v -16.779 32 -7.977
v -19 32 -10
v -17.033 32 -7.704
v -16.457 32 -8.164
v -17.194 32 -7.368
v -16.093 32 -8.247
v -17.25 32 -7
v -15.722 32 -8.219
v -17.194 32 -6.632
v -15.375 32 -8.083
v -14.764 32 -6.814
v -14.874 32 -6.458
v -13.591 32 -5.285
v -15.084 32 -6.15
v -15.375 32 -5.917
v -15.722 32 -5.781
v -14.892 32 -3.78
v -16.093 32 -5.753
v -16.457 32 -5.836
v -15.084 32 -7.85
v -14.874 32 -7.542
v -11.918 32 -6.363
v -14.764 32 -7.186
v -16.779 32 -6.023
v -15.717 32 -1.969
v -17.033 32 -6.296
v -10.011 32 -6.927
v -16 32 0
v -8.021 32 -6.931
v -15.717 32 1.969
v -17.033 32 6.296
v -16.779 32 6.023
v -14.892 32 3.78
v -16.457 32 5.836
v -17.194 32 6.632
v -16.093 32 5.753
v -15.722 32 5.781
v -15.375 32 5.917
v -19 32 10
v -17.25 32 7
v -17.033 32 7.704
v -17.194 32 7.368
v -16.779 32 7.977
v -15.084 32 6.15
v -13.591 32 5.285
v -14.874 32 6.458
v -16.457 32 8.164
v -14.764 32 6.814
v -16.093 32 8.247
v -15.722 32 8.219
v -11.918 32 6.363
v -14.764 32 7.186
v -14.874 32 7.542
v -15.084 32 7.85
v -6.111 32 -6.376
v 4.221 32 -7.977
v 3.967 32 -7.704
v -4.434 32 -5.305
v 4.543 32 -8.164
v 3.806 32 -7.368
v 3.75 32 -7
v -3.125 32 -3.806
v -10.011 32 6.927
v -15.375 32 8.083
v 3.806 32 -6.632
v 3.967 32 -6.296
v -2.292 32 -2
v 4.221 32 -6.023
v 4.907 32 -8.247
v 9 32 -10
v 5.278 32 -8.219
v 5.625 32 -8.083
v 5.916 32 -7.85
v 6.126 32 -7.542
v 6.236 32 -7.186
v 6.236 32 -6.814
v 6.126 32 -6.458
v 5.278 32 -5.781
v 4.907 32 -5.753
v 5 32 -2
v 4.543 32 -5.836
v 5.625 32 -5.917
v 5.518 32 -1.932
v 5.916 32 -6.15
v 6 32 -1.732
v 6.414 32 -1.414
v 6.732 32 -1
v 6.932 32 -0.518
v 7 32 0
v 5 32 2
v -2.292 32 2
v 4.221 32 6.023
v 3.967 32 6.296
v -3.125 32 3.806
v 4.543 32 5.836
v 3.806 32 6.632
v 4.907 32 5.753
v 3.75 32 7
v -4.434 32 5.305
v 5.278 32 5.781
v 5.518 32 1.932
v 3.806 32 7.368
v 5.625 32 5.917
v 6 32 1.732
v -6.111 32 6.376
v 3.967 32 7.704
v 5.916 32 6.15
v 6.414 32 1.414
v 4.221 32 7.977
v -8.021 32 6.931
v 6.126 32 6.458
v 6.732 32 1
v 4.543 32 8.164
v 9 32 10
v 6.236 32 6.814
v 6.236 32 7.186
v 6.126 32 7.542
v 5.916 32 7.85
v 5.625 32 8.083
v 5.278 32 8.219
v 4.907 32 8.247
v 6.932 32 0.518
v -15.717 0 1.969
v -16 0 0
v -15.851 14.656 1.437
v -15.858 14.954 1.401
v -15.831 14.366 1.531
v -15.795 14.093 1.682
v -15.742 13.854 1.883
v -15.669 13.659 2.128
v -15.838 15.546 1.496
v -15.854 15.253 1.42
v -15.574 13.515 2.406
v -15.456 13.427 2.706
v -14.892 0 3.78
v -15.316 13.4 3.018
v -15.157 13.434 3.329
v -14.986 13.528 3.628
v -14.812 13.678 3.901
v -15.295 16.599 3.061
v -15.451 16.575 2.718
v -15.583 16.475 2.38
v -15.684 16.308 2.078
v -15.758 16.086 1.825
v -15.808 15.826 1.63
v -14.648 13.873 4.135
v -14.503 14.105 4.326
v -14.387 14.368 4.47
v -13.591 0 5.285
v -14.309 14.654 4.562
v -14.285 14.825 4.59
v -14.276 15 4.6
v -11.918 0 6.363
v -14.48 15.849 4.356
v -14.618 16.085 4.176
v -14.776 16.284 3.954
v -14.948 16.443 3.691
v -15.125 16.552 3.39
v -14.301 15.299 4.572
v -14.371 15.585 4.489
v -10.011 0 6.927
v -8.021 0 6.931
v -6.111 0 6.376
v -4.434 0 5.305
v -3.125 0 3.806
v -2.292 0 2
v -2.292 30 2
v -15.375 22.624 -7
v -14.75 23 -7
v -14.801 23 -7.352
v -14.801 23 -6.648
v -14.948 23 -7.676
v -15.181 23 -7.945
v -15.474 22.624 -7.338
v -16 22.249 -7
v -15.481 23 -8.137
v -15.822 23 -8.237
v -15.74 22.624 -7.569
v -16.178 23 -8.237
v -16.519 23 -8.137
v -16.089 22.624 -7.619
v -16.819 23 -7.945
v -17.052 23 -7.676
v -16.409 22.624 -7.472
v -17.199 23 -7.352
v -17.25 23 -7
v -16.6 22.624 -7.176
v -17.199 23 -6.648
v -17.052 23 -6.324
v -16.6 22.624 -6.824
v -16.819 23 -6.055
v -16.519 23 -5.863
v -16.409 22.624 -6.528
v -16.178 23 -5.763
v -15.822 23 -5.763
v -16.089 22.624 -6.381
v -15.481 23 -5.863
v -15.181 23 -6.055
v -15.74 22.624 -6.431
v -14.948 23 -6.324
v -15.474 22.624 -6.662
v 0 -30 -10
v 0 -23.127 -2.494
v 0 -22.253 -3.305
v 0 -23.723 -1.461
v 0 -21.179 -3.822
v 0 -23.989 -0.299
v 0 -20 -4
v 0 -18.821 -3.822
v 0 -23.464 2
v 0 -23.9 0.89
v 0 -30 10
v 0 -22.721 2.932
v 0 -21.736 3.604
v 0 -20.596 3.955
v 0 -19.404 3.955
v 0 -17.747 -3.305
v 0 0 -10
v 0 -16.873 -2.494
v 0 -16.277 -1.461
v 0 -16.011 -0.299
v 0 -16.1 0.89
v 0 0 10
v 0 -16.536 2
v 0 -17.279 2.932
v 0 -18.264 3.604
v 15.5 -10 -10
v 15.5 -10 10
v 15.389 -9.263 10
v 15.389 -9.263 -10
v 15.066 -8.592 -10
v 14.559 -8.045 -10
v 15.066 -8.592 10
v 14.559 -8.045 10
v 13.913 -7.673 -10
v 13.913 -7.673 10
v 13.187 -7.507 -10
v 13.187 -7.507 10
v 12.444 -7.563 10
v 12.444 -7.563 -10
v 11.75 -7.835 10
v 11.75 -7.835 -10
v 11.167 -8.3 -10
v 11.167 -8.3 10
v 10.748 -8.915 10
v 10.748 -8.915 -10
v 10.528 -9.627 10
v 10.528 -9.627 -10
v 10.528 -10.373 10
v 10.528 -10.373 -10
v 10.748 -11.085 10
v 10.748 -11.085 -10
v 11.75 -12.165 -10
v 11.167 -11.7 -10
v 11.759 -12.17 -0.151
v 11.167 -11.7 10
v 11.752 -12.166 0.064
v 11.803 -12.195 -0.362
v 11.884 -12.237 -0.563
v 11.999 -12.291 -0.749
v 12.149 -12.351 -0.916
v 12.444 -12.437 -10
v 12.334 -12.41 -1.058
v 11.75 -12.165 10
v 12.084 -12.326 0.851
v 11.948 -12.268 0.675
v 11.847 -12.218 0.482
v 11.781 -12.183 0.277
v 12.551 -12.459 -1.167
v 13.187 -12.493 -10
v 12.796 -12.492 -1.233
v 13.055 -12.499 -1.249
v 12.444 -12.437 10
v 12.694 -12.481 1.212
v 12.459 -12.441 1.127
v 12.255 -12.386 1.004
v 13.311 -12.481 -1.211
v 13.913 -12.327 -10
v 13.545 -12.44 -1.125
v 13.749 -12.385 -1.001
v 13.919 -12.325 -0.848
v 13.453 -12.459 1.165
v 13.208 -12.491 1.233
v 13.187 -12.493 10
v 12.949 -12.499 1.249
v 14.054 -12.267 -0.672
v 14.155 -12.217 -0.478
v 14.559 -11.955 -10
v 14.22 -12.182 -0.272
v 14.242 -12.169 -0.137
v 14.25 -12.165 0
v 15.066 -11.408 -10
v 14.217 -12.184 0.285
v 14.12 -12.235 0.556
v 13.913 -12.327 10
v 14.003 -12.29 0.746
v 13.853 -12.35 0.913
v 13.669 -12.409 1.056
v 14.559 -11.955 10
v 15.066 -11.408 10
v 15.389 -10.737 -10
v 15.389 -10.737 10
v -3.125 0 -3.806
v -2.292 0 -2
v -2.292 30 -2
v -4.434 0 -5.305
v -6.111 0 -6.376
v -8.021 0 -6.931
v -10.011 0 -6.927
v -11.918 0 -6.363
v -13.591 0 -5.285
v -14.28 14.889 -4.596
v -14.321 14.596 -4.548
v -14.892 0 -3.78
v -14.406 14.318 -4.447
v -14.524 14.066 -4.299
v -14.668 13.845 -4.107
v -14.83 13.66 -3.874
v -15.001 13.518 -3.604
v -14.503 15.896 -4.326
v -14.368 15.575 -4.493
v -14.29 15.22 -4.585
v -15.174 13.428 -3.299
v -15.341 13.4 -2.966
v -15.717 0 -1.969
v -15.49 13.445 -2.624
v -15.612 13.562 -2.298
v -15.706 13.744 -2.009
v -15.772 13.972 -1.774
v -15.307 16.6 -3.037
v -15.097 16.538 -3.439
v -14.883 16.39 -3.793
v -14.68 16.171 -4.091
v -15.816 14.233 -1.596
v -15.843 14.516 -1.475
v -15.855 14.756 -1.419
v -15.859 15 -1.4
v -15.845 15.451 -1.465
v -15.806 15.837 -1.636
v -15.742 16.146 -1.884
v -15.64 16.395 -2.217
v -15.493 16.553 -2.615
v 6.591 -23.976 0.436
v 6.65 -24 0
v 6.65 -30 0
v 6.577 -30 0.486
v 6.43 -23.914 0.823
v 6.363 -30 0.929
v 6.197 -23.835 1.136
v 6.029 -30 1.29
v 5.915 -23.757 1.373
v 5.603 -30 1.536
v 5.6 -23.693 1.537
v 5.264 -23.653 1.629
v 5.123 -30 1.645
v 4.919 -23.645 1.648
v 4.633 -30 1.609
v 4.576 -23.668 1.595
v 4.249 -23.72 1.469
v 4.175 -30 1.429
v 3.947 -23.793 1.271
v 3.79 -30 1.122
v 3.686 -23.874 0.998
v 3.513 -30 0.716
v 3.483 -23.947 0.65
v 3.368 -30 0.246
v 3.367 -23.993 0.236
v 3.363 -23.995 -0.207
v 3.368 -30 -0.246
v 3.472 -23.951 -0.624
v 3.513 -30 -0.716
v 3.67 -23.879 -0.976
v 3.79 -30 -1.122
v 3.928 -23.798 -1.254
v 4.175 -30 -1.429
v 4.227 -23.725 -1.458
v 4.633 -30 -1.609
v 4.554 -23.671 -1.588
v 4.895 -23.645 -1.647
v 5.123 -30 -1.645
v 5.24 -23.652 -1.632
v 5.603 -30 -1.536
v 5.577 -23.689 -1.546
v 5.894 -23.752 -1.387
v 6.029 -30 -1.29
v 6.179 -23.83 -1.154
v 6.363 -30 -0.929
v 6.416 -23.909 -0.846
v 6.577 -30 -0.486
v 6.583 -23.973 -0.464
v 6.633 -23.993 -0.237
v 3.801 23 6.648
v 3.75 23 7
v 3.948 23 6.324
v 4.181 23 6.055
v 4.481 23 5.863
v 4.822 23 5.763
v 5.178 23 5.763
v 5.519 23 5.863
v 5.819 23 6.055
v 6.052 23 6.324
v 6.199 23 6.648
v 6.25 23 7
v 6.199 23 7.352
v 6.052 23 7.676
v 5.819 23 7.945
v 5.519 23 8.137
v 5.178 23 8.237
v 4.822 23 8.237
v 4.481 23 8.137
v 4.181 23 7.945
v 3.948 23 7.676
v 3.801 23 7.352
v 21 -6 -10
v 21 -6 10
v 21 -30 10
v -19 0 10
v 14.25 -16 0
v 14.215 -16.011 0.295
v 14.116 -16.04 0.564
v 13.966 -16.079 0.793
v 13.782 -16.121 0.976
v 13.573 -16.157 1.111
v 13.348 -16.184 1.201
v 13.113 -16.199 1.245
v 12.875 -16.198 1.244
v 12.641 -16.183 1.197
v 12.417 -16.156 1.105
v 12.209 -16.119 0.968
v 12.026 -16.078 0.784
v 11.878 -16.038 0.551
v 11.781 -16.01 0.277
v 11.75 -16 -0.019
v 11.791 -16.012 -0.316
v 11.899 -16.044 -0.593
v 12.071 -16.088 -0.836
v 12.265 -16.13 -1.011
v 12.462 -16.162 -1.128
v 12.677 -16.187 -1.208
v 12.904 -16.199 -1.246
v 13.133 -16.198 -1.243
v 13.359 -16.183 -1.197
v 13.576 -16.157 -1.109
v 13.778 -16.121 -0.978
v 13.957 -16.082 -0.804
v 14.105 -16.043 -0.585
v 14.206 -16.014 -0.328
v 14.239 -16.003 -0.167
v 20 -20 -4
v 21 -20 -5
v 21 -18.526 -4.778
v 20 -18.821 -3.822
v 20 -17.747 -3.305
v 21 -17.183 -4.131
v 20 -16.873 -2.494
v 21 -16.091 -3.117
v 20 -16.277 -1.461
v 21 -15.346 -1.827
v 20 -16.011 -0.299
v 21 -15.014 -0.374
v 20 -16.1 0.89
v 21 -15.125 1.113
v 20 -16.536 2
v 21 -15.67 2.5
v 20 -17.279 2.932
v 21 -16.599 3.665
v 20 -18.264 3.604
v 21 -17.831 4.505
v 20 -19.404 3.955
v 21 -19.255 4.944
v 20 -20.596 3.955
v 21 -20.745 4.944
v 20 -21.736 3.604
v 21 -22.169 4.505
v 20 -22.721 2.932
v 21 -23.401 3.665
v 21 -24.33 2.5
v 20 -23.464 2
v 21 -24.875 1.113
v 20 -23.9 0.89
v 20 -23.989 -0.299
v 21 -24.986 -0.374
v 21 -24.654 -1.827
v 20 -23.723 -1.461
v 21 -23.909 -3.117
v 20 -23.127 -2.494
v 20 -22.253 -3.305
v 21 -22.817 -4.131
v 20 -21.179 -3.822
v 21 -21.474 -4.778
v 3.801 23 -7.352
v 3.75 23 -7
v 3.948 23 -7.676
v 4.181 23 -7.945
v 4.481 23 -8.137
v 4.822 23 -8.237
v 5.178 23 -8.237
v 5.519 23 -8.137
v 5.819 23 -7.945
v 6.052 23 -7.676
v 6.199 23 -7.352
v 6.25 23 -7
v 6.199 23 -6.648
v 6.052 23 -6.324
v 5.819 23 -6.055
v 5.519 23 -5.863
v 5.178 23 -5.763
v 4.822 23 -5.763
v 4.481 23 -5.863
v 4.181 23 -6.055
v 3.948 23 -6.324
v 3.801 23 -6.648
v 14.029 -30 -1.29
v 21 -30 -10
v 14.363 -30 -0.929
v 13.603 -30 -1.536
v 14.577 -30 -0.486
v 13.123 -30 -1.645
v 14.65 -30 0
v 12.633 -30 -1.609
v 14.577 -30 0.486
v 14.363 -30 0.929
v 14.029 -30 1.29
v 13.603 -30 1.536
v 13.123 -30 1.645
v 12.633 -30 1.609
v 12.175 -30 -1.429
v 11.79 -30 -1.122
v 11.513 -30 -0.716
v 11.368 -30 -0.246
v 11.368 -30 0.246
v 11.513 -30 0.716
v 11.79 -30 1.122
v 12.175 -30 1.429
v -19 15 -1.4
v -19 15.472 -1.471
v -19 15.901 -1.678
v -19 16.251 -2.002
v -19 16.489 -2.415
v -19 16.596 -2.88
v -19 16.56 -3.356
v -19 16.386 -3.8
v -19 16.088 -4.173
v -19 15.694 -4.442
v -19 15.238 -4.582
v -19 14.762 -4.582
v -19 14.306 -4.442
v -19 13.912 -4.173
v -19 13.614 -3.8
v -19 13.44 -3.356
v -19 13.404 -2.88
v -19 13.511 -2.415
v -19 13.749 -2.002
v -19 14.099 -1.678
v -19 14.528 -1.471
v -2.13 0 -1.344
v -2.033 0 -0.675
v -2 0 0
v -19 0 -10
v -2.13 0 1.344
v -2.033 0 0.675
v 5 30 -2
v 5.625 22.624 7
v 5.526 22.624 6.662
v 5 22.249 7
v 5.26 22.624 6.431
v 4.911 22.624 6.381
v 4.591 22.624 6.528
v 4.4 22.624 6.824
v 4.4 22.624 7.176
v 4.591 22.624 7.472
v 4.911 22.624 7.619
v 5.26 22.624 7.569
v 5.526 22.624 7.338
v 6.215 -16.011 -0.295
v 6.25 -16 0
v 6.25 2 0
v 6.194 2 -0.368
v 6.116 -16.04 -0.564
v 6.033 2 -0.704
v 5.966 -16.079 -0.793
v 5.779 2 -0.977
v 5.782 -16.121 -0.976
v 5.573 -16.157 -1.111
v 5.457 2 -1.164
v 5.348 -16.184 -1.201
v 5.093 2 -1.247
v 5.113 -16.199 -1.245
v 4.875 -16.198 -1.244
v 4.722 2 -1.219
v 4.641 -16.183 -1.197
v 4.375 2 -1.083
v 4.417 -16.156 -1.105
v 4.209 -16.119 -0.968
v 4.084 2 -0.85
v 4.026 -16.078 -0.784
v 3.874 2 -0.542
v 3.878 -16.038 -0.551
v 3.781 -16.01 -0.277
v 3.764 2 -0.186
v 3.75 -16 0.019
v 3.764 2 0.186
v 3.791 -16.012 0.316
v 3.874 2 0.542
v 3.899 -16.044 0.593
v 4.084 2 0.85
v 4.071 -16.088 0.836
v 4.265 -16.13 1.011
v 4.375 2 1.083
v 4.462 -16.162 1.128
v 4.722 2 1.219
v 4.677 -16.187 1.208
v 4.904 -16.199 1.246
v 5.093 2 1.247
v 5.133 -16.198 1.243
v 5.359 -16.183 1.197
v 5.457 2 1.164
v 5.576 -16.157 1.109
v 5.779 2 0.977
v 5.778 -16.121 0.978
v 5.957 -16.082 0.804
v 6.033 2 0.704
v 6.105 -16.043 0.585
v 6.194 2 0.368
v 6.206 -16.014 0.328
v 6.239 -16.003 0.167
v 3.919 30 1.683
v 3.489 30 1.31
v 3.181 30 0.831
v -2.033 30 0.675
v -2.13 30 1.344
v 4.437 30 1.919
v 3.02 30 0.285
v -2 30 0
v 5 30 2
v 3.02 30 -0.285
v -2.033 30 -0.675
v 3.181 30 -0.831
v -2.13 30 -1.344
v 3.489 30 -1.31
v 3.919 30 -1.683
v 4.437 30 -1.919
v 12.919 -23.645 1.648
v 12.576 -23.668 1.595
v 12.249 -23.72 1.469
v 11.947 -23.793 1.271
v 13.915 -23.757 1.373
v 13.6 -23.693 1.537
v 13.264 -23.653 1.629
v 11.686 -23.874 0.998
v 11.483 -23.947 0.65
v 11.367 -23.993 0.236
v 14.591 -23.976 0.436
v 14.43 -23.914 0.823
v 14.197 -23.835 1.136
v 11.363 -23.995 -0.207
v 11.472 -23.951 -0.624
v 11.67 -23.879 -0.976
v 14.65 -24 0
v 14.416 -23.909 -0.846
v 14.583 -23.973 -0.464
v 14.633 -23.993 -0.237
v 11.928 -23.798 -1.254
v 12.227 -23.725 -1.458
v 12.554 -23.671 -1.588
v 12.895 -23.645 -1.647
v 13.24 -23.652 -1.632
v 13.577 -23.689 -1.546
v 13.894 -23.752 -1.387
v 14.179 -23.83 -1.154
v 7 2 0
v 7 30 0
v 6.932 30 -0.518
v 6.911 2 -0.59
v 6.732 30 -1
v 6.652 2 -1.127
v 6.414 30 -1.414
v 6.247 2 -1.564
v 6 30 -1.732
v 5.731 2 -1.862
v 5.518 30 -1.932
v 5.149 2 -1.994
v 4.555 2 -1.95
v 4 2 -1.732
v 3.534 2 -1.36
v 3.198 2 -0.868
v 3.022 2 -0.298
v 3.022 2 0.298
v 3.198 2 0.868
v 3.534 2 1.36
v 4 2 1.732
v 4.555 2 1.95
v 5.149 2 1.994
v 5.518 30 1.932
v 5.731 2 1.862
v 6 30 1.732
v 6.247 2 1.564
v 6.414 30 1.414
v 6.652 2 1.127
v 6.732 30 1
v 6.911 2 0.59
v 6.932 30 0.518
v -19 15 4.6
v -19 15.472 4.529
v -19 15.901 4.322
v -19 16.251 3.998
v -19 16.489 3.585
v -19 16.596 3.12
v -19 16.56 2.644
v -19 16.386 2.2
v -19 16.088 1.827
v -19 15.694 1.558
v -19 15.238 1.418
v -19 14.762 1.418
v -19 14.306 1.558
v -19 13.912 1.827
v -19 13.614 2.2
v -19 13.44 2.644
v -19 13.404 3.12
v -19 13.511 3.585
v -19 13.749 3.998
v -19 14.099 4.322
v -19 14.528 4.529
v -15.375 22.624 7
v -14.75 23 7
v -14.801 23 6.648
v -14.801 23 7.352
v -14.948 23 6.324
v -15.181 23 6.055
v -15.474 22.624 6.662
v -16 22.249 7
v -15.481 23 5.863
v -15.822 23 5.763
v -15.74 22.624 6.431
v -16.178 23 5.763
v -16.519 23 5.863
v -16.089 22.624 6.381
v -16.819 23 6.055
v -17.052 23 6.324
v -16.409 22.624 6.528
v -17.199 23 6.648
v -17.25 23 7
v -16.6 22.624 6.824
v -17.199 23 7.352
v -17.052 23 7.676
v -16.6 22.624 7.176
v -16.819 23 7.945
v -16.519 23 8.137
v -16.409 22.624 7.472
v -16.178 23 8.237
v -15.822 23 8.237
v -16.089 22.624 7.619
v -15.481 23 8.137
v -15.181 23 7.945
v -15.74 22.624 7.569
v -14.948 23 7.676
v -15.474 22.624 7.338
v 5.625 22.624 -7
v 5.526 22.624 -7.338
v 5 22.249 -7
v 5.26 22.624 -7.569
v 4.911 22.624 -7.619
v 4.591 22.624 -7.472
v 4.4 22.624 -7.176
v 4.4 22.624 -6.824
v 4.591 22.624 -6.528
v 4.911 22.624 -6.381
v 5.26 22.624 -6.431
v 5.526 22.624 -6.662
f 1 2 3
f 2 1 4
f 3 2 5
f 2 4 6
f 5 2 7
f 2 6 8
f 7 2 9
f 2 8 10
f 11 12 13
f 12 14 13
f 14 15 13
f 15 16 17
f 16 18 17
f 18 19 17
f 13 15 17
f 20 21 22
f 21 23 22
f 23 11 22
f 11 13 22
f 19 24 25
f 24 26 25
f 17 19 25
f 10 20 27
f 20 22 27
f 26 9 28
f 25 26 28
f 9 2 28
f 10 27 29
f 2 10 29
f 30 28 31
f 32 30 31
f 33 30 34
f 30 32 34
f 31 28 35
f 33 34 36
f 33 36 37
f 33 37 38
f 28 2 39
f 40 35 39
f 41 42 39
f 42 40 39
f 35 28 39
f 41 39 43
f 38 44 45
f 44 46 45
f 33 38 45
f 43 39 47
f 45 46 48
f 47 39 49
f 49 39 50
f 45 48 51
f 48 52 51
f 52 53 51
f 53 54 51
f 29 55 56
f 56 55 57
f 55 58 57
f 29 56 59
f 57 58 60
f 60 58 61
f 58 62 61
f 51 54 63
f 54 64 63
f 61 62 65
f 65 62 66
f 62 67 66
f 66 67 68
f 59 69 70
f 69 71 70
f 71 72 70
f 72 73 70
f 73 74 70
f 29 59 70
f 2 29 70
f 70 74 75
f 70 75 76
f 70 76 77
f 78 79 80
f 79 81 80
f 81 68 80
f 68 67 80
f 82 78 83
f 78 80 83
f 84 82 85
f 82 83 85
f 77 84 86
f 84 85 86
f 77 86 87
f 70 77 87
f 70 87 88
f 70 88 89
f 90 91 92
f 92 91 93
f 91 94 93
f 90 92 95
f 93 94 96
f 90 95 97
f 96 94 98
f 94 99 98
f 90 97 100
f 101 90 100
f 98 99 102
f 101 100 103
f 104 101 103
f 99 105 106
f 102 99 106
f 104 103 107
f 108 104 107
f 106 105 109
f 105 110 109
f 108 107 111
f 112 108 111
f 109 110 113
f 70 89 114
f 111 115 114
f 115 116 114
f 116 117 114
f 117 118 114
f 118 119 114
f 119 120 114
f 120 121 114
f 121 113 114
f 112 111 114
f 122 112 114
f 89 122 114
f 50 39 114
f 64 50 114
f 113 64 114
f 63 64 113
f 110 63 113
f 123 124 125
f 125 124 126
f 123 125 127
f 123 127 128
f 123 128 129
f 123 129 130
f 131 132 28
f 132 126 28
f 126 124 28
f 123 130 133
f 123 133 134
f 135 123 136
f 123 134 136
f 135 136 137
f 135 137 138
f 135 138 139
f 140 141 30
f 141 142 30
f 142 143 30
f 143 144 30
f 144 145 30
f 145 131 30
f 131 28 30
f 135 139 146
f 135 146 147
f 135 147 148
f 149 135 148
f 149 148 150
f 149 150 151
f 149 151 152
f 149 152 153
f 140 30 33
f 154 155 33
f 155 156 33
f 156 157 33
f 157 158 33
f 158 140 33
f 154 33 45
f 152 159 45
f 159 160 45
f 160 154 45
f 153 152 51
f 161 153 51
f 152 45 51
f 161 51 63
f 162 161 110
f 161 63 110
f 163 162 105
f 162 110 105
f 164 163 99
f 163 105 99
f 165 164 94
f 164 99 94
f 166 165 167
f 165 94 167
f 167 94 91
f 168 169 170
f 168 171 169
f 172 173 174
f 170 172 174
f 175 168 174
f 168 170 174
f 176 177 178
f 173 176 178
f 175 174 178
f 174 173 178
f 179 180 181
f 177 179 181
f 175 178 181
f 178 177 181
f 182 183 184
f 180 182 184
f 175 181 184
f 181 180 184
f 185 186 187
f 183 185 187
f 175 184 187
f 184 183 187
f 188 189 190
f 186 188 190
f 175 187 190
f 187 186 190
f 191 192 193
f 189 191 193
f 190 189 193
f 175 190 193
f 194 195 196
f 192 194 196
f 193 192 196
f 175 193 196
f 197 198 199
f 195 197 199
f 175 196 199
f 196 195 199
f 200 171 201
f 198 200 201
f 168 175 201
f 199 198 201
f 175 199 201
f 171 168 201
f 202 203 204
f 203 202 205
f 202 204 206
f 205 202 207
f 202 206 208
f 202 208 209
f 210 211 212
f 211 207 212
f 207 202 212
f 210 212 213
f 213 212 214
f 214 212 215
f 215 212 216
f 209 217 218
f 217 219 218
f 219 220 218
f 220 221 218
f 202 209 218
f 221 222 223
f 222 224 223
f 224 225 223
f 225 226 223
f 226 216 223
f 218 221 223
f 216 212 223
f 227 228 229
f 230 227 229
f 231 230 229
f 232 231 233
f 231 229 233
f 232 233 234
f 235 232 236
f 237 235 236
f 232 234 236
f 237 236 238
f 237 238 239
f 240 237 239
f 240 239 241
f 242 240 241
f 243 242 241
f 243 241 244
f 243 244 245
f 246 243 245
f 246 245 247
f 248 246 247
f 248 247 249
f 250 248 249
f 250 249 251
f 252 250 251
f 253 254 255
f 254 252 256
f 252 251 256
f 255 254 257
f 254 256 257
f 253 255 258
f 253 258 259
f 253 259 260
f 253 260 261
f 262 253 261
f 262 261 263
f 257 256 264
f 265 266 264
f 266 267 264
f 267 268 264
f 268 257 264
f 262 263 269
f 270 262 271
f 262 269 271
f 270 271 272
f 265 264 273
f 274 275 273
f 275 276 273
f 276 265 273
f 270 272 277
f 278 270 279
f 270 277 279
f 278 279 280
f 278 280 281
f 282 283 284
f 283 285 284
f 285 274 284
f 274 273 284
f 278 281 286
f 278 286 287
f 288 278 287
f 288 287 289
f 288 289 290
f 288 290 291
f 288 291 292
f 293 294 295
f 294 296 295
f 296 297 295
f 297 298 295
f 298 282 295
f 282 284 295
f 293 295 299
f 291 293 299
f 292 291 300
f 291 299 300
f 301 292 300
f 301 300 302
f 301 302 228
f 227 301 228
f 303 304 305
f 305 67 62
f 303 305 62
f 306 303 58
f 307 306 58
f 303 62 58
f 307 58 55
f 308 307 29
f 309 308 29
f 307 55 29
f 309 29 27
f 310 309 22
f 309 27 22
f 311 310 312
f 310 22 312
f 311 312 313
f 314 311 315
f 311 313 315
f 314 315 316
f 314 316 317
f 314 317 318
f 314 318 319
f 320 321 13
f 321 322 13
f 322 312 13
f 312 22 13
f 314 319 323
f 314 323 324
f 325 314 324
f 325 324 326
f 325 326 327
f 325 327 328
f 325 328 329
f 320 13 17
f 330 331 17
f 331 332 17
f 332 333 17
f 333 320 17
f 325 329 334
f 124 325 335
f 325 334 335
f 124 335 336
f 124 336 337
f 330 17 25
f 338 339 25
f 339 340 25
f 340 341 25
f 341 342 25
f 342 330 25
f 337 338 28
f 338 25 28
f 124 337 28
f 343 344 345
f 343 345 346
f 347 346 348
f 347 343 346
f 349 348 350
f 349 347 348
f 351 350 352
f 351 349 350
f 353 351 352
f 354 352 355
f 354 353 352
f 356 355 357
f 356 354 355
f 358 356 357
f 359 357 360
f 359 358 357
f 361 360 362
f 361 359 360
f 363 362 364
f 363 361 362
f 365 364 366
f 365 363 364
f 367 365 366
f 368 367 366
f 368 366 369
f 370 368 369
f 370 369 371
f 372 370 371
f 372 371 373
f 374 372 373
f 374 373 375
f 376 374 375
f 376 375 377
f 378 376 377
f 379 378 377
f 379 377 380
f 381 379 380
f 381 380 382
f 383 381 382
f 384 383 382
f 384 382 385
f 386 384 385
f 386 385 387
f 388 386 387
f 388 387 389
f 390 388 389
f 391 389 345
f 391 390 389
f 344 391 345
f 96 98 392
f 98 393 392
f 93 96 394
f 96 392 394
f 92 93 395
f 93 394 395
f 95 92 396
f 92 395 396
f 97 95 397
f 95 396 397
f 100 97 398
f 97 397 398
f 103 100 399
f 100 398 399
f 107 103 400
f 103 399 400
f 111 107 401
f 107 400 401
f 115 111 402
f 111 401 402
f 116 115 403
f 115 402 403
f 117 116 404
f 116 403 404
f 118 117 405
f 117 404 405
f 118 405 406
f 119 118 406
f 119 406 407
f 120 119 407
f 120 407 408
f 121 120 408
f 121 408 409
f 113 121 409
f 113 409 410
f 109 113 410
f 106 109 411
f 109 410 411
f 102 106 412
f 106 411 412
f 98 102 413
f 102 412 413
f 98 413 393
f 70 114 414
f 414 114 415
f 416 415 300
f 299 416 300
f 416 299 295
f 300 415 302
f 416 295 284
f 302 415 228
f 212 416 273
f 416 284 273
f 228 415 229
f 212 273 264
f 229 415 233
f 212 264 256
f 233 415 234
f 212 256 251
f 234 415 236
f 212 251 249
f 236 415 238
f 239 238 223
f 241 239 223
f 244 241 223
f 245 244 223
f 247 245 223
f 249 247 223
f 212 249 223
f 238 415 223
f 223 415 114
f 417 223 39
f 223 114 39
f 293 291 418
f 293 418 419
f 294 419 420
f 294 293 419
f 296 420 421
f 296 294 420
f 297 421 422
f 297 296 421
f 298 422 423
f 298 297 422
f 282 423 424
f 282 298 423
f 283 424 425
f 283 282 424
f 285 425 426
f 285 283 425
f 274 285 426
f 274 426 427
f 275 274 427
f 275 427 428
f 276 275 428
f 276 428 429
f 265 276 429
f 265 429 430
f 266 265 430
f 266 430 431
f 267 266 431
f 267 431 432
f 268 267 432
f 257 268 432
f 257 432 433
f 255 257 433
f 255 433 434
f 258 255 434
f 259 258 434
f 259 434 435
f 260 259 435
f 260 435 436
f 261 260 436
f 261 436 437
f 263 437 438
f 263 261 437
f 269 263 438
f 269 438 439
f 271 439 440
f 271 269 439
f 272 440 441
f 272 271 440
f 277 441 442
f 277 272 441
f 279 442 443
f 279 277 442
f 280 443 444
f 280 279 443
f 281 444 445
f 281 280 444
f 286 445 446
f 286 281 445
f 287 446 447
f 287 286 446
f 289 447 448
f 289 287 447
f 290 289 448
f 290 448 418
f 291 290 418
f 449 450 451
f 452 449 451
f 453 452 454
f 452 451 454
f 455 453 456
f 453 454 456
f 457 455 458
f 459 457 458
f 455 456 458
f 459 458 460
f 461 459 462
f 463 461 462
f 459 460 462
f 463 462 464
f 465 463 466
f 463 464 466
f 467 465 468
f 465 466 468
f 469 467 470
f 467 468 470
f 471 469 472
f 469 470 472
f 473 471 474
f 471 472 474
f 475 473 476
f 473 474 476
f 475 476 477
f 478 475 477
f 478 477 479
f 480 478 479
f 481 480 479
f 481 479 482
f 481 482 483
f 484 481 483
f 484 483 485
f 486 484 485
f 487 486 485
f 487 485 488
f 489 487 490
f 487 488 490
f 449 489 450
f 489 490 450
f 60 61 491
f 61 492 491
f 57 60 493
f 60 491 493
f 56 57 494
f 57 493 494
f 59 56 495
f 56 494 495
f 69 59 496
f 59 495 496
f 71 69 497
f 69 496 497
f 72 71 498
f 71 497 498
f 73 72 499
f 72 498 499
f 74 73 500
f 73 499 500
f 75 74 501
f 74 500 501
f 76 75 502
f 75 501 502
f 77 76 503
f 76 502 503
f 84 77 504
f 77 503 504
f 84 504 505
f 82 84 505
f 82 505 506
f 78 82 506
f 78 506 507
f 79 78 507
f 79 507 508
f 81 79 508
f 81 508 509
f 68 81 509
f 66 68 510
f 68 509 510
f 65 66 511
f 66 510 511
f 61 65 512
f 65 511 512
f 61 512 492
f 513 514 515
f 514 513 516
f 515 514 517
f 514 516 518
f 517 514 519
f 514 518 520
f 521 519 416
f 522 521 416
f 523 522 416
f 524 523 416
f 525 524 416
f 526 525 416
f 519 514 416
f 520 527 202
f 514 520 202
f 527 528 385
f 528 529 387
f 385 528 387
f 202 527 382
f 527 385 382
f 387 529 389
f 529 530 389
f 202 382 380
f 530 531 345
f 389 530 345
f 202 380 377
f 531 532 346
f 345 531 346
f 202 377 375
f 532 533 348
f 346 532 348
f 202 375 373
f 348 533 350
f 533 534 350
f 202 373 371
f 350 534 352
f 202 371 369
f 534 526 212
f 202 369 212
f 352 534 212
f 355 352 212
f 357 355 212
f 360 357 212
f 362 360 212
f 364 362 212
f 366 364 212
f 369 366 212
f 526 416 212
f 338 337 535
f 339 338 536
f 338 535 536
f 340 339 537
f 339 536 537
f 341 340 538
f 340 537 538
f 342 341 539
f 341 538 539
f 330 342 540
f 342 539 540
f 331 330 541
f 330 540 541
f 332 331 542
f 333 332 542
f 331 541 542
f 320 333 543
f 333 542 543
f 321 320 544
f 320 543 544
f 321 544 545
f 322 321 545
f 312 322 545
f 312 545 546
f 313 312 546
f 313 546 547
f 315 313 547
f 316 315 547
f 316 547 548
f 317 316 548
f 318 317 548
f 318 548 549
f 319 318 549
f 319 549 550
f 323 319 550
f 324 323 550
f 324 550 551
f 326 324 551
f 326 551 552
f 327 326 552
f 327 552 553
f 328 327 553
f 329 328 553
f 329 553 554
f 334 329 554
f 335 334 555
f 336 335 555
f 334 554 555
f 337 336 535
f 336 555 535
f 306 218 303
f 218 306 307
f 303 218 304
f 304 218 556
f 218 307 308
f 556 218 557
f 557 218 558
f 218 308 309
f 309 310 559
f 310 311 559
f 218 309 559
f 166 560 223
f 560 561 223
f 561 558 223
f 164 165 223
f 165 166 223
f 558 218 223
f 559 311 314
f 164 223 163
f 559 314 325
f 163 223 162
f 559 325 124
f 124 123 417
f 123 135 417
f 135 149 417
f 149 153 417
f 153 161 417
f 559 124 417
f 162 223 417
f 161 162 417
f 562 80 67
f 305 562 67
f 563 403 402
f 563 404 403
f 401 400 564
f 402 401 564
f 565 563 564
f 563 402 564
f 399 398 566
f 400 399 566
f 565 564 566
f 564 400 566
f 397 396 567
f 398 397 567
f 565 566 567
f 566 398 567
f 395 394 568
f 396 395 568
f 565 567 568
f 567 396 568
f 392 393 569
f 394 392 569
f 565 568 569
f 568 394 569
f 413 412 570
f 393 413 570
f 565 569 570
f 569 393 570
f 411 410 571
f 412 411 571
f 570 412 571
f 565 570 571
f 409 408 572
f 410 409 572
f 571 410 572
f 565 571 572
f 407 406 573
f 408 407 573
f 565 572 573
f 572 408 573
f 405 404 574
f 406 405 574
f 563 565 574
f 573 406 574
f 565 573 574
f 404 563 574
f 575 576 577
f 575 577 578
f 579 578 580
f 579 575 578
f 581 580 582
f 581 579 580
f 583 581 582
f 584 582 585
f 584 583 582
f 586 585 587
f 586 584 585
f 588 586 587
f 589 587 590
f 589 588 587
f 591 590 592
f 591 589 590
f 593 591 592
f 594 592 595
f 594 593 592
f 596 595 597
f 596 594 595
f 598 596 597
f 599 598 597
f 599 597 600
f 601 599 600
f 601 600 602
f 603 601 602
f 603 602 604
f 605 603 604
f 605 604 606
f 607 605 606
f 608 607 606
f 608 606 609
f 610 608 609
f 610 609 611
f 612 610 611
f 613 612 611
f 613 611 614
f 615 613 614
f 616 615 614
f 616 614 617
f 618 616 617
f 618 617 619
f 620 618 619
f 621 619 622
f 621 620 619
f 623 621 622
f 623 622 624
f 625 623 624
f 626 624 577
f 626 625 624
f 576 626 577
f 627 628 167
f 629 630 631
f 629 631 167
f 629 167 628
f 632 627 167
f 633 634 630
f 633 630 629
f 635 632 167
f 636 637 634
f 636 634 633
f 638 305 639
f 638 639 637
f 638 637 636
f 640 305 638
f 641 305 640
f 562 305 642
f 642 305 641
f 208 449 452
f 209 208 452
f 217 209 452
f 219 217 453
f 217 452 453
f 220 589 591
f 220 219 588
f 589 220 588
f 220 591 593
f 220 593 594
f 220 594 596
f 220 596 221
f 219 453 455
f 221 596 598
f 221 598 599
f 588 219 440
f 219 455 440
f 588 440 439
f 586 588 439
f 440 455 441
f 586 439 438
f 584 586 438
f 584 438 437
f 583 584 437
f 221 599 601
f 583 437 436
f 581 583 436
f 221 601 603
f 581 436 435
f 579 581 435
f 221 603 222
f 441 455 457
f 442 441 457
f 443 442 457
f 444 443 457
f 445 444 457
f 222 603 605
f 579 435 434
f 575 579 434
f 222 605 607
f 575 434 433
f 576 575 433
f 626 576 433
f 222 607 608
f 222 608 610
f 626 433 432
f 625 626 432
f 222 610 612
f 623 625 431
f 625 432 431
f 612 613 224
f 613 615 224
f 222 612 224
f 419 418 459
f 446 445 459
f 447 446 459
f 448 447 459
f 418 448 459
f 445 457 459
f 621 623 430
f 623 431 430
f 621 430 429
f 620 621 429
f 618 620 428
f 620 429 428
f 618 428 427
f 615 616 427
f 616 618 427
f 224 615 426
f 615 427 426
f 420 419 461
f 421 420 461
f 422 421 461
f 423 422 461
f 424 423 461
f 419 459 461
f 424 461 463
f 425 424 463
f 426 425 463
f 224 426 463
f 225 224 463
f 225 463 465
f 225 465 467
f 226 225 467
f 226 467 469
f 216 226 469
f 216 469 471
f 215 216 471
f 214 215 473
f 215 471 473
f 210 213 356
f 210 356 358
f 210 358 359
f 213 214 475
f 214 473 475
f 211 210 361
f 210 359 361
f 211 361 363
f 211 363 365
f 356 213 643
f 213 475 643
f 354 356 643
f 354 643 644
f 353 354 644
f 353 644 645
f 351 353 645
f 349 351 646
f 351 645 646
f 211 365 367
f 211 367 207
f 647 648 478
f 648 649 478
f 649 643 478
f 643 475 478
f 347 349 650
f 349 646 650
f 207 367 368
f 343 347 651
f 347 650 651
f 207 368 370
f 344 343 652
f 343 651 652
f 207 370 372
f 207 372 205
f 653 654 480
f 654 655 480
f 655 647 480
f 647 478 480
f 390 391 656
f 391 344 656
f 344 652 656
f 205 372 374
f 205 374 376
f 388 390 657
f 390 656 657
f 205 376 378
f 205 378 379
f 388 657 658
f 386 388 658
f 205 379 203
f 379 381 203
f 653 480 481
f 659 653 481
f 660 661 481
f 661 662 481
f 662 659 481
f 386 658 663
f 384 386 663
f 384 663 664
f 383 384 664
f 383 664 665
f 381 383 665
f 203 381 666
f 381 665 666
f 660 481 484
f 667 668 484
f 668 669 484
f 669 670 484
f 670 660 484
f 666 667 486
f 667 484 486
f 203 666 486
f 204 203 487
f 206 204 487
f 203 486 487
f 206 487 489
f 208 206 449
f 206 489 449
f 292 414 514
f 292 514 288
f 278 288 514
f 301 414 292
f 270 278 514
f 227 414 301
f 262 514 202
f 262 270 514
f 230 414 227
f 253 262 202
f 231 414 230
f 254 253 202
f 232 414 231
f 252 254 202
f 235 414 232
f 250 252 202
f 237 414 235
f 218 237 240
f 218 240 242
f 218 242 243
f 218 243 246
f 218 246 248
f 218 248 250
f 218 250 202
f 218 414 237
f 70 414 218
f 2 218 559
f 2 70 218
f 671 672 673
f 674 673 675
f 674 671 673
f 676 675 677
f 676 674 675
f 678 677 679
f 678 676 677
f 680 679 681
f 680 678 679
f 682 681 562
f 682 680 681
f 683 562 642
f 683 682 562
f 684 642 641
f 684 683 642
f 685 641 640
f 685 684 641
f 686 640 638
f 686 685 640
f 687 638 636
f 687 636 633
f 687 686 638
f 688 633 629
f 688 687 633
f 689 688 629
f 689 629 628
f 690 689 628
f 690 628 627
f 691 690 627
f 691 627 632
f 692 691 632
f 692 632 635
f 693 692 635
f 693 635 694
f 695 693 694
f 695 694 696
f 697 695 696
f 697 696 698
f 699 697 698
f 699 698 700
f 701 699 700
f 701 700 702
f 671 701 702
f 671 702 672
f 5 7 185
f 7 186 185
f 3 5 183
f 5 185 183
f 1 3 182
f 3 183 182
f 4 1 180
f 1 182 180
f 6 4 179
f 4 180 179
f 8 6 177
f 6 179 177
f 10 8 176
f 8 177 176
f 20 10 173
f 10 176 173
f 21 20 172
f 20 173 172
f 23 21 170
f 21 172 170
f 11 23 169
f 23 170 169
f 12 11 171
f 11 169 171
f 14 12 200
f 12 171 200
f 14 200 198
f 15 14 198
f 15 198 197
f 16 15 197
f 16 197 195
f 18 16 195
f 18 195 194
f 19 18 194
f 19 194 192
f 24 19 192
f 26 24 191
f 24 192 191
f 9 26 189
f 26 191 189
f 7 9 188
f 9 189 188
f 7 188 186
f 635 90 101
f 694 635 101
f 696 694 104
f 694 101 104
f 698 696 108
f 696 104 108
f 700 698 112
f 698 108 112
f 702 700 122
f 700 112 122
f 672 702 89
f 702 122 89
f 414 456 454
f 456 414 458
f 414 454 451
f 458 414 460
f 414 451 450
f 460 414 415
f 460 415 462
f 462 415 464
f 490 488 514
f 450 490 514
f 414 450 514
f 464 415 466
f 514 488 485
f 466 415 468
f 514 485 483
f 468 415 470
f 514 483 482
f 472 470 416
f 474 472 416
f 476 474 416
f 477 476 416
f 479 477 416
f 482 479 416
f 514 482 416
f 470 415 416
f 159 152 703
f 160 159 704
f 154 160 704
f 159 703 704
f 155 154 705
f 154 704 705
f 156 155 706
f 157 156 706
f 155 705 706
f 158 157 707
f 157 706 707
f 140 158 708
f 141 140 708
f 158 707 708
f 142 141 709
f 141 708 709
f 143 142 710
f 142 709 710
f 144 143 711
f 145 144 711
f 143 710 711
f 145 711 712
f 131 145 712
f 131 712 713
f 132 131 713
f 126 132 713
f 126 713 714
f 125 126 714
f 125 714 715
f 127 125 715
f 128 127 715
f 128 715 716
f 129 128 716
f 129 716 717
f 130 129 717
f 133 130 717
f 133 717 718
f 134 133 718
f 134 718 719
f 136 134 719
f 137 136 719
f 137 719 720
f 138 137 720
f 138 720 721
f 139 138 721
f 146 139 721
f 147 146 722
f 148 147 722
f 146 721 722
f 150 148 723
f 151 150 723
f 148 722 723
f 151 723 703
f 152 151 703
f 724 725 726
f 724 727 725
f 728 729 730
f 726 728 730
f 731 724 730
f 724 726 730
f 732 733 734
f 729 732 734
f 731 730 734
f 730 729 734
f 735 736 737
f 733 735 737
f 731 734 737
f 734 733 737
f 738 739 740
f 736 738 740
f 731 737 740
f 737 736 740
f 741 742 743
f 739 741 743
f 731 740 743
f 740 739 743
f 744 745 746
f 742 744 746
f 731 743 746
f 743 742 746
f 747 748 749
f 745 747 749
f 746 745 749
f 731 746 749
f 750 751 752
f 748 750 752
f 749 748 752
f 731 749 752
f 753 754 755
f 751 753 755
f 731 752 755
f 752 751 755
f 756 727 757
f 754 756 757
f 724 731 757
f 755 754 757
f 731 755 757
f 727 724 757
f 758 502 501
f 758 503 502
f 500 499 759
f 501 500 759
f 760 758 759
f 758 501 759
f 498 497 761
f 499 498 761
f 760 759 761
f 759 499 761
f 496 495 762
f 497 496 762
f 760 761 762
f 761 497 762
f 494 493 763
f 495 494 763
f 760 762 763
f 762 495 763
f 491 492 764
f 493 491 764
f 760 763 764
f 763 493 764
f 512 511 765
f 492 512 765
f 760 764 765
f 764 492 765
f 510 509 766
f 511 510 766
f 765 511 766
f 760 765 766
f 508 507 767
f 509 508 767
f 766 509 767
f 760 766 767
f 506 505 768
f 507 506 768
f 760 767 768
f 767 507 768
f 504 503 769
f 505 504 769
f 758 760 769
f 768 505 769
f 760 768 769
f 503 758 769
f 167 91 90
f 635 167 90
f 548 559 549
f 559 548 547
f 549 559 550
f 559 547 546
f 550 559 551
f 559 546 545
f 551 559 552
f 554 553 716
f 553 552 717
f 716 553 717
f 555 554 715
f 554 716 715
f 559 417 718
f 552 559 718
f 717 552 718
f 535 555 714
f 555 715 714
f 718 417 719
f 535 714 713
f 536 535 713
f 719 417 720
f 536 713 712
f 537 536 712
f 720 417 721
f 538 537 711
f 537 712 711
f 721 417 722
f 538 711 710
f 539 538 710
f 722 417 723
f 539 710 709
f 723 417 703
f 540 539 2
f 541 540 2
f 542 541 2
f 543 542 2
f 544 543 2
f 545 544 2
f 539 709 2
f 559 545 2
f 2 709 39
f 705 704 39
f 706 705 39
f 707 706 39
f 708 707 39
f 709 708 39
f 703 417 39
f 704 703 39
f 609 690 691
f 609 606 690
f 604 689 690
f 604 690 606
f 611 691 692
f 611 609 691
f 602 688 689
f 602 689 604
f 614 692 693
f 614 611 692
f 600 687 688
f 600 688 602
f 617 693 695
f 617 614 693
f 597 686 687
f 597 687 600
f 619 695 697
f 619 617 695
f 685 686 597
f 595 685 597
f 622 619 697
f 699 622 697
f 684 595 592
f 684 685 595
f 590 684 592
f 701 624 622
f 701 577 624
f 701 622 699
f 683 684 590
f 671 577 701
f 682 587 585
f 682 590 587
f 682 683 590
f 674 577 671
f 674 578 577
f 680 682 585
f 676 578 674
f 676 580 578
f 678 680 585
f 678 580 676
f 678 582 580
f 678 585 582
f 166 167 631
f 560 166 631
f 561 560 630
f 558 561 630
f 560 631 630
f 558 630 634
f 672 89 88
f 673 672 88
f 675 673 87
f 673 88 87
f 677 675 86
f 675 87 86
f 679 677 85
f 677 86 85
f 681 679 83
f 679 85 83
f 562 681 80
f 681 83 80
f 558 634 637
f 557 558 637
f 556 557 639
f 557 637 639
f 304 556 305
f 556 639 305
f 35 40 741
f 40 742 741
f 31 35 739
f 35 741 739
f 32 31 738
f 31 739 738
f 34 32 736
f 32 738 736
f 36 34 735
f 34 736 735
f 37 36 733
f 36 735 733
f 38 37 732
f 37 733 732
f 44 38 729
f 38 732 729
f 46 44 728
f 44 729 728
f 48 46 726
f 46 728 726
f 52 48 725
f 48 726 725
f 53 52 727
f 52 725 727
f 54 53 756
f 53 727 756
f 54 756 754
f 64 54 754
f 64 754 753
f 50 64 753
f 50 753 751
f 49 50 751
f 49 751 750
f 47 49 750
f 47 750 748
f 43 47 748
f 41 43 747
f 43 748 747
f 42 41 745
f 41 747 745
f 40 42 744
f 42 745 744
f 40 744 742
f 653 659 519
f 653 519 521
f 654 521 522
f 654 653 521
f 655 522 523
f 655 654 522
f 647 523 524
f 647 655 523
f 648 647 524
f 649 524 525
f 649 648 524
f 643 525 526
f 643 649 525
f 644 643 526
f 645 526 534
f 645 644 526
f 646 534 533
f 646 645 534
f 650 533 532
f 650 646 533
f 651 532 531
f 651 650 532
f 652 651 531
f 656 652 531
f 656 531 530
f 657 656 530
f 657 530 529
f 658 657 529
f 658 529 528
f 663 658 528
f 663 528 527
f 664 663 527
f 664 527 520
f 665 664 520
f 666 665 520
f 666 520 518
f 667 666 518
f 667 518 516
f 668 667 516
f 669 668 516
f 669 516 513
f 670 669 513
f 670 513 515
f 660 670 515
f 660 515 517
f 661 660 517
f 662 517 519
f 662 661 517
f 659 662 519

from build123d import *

# Parameters (mm, degrees)
BOSS_EXTRUDE1_DEPTH      = 10
CUT_EXTRUDE1_DEPTH       = 67.219333
CUT_EXTRUDE2_DEPTH       = 2
M3_TAPPED_HOLE1_D        = 2.5
M3_TAPPED_HOLE1_DEPTH    = 9
M3_TAPPED_HOLE1_TIP      = 0.751076
SKETCH6_R                = 2.5
CUT_EXTRUDE3_DEPTH       = 44.185646
SKETCH7_R                = 4
CUT_EXTRUDE4_DEPTH       = 53.191953
CHAMFER1_SIZE            = 1
HOLE1_START              = 2
HOLE1_OUTLINE_R          = 2
HOLE1_DEPTH              = 28
HOLE1_START_2            = -17
HOLE1_2_OUTLINE_R        = 1.25
HOLE1_2_DEPTH            = 19
CUT_EXTRUDE5_REACH       = 54.192
CUT_EXTRUDE5_END_RADIUS  = 7
SKETCH10_R               = 1.6
CUT_EXTRUDE6_START       = -6.35617
CUT_EXTRUDE6_OUTLINE_R   = 1.65
CUT_EXTRUDE6_DEPTH       = 6.35617
CUT_EXTRUDE6_START_2     = -17.834937
CUT_EXTRUDE6_2_OUTLINE_R = 1.25
CUT_EXTRUDE6_2_DEPTH     = 11.478767


with BuildPart() as part:
    # Sketch2 → Boss-Extrude1 (new, symmetric)
    with BuildSketch(Plane.XY):
        Polygon((0, 0), (-19, 0), (-19, 32), (9, 32), (21, -6), (21, -30), (0, -30), align=None)
    extrude(amount=BOSS_EXTRUDE1_DEPTH, both=True)

    # Sketch3 → Cut-Extrude1 (cut, through all)
    with BuildSketch(Plane(origin=(0, 32, 0), x_dir=(1, 0, 0), z_dir=(0, 1, 0))):
        with BuildLine():
            ThreePointArc((-2.291796, 2), (-10.010587, 6.926667), (-16, 0))
            Line((-16, 0), (-2, 0))
            ThreePointArc((-2, 0), (-2.073333, 1.010587), (-2.291796, 2))
        make_face()
        with BuildLine():
            Line((-2, 0), (-16, 0))
            ThreePointArc((-16, 0), (-10.010587, -6.926667), (-2.291796, -2))
            ThreePointArc((-2.291796, -2), (-2.073333, -1.010587), (-2, 0))
        make_face()
    extrude(amount=-CUT_EXTRUDE1_DEPTH, mode=Mode.SUBTRACT)

    # Sketch3<3> → Cut-Extrude2 (cut)
    with BuildSketch(Plane(origin=(0, 32, 0), x_dir=(1, 0, 0), z_dir=(0, 1, 0))):
        with BuildLine():
            ThreePointArc((-2.291796, 2), (-2.073333, 1.010587), (-2, 0))
            Line((-2, 0), (3, 0))
            ThreePointArc((3, 0), (3.585786, 1.414214), (5, 2))
            Line((5, 2), (-2.291796, 2))
        make_face()
        with BuildLine():
            Line((3, 0), (-2, 0))
            ThreePointArc((-2, 0), (-2.073333, -1.010587), (-2.291796, -2))
            Line((-2.291796, -2), (5, -2))
            ThreePointArc((5, -2), (3.585786, -1.414214), (3, 0))
        make_face()
        with BuildLine():
            ThreePointArc((5, 2), (3.585786, 1.414214), (3, 0))
            Line((3, 0), (7, 0))
            ThreePointArc((7, 0), (6.414214, 1.414214), (5, 2))
        make_face()
        with BuildLine():
            Line((7, 0), (3, 0))
            ThreePointArc((3, 0), (3.585786, -1.414214), (5, -2))
            ThreePointArc((5, -2), (6.414214, -1.414214), (7, 0))
        make_face()
    extrude(amount=-CUT_EXTRUDE2_DEPTH, mode=Mode.SUBTRACT)

    # M3 Tapped Hole1
    with Locations(Plane(origin=(0, 32, 0), x_dir=(1, 0, 0), z_dir=(0, 1, 0))):
        with Locations((-16, 7), (-16, -7), (5, -7), (5, 7)):
            Hole(M3_TAPPED_HOLE1_D / 2, depth=M3_TAPPED_HOLE1_DEPTH)
            with Locations((0, 0, -(M3_TAPPED_HOLE1_DEPTH + M3_TAPPED_HOLE1_TIP / 2))):  # 118° drill point
                Cone(0, M3_TAPPED_HOLE1_D / 2, M3_TAPPED_HOLE1_TIP, mode=Mode.SUBTRACT)

    # Sketch6 → Cut-Extrude3 (cut, through all)
    with BuildSketch(Plane.XY.offset(10)):
        with Locations((13, -10)):
            Circle(SKETCH6_R)
    extrude(amount=-CUT_EXTRUDE3_DEPTH, mode=Mode.SUBTRACT)

    # Sketch7 → Cut-Extrude4 (cut, through all)
    with BuildSketch(Plane(origin=(21, 0, 0), x_dir=(0, 0, -1), z_dir=(1, 0, 0))):
        with Locations((0, -20)):
            Circle(SKETCH7_R)
    extrude(amount=-CUT_EXTRUDE4_DEPTH, mode=Mode.SUBTRACT)

    # Chamfer1
    chamfer1_edges = [part.edges().sort_by_distance(p)[0] for p in [
        (21, -20, 4),
    ]]
    chamfer(chamfer1_edges, length=CHAMFER1_SIZE)

    # Hole1: read off the stored shape, not the designer's step
    # Hole1 outline → Hole1 (cut)
    with BuildSketch(Plane(origin=(0, 0, 0), x_dir=(1, 0, 0), z_dir=(0, 1, 0)).offset(HOLE1_START)):
        with Locations((5, 0)):
            Circle(HOLE1_OUTLINE_R)
    extrude(amount=HOLE1_DEPTH, mode=Mode.SUBTRACT)

    # Hole1 2 outline → Hole1 2 (cut)
    with BuildSketch(Plane(origin=(0, 0, 0), x_dir=(1, 0, 0), z_dir=(0, 1, 0)).offset(HOLE1_START_2)):
        with Locations((5, 0)):
            Circle(HOLE1_2_OUTLINE_R)
    extrude(amount=HOLE1_2_DEPTH, mode=Mode.SUBTRACT)

    # Cut-Extrude5: up to this cylinder (the profile starts outside it)
    cut_extrude5_end = Plane(origin=(-9, 15, 0), z_dir=(0, 1, 0)) * Cylinder(CUT_EXTRUDE5_END_RADIUS, 123.384, mode=Mode.PRIVATE)
    # Sketch10 → Cut-Extrude5 (cut, up to the surface)
    with BuildSketch(Plane.ZY.offset(19), mode=Mode.PRIVATE) as cut_extrude5_sk1:
        with Locations((-3, 15)):
            Circle(SKETCH10_R)
    cut_extrude5_tool1 = extrude(cut_extrude5_sk1.sketch, amount=-CUT_EXTRUDE5_REACH, mode=Mode.PRIVATE) - cut_extrude5_end
    add(cut_extrude5_tool1.solids().sort_by_distance((-19, 15, -3))[0], mode=Mode.SUBTRACT)
    # Sketch10 → Cut-Extrude5 (cut, up to the surface)
    with BuildSketch(Plane.ZY.offset(19), mode=Mode.PRIVATE) as cut_extrude5_sk2:
        with Locations((3, 15)):
            Circle(SKETCH10_R)
    cut_extrude5_tool2 = extrude(cut_extrude5_sk2.sketch, amount=-CUT_EXTRUDE5_REACH, mode=Mode.PRIVATE) - cut_extrude5_end
    add(cut_extrude5_tool2.solids().sort_by_distance((-19, 15, 3))[0], mode=Mode.SUBTRACT)

    # Cut-Extrude6: read off the stored shape, not the designer's step
    # Cut-Extrude6 outline → Cut-Extrude6 (cut)
    with BuildSketch(Plane.XZ.offset(30).offset(CUT_EXTRUDE6_START)):
        with Locations((5, 0)):
            Circle(CUT_EXTRUDE6_OUTLINE_R)
        with Locations((13, 0)):
            Circle(CUT_EXTRUDE6_OUTLINE_R)
    extrude(amount=CUT_EXTRUDE6_DEPTH, mode=Mode.SUBTRACT)

    # Cut-Extrude6 2 outline → Cut-Extrude6 2 (cut)
    with BuildSketch(Plane.XZ.offset(30).offset(CUT_EXTRUDE6_START_2)):
        with Locations((13, 0)):
            Circle(CUT_EXTRUDE6_2_OUTLINE_R)
    extrude(amount=CUT_EXTRUDE6_2_DEPTH, mode=Mode.SUBTRACT)


solid = part.part
